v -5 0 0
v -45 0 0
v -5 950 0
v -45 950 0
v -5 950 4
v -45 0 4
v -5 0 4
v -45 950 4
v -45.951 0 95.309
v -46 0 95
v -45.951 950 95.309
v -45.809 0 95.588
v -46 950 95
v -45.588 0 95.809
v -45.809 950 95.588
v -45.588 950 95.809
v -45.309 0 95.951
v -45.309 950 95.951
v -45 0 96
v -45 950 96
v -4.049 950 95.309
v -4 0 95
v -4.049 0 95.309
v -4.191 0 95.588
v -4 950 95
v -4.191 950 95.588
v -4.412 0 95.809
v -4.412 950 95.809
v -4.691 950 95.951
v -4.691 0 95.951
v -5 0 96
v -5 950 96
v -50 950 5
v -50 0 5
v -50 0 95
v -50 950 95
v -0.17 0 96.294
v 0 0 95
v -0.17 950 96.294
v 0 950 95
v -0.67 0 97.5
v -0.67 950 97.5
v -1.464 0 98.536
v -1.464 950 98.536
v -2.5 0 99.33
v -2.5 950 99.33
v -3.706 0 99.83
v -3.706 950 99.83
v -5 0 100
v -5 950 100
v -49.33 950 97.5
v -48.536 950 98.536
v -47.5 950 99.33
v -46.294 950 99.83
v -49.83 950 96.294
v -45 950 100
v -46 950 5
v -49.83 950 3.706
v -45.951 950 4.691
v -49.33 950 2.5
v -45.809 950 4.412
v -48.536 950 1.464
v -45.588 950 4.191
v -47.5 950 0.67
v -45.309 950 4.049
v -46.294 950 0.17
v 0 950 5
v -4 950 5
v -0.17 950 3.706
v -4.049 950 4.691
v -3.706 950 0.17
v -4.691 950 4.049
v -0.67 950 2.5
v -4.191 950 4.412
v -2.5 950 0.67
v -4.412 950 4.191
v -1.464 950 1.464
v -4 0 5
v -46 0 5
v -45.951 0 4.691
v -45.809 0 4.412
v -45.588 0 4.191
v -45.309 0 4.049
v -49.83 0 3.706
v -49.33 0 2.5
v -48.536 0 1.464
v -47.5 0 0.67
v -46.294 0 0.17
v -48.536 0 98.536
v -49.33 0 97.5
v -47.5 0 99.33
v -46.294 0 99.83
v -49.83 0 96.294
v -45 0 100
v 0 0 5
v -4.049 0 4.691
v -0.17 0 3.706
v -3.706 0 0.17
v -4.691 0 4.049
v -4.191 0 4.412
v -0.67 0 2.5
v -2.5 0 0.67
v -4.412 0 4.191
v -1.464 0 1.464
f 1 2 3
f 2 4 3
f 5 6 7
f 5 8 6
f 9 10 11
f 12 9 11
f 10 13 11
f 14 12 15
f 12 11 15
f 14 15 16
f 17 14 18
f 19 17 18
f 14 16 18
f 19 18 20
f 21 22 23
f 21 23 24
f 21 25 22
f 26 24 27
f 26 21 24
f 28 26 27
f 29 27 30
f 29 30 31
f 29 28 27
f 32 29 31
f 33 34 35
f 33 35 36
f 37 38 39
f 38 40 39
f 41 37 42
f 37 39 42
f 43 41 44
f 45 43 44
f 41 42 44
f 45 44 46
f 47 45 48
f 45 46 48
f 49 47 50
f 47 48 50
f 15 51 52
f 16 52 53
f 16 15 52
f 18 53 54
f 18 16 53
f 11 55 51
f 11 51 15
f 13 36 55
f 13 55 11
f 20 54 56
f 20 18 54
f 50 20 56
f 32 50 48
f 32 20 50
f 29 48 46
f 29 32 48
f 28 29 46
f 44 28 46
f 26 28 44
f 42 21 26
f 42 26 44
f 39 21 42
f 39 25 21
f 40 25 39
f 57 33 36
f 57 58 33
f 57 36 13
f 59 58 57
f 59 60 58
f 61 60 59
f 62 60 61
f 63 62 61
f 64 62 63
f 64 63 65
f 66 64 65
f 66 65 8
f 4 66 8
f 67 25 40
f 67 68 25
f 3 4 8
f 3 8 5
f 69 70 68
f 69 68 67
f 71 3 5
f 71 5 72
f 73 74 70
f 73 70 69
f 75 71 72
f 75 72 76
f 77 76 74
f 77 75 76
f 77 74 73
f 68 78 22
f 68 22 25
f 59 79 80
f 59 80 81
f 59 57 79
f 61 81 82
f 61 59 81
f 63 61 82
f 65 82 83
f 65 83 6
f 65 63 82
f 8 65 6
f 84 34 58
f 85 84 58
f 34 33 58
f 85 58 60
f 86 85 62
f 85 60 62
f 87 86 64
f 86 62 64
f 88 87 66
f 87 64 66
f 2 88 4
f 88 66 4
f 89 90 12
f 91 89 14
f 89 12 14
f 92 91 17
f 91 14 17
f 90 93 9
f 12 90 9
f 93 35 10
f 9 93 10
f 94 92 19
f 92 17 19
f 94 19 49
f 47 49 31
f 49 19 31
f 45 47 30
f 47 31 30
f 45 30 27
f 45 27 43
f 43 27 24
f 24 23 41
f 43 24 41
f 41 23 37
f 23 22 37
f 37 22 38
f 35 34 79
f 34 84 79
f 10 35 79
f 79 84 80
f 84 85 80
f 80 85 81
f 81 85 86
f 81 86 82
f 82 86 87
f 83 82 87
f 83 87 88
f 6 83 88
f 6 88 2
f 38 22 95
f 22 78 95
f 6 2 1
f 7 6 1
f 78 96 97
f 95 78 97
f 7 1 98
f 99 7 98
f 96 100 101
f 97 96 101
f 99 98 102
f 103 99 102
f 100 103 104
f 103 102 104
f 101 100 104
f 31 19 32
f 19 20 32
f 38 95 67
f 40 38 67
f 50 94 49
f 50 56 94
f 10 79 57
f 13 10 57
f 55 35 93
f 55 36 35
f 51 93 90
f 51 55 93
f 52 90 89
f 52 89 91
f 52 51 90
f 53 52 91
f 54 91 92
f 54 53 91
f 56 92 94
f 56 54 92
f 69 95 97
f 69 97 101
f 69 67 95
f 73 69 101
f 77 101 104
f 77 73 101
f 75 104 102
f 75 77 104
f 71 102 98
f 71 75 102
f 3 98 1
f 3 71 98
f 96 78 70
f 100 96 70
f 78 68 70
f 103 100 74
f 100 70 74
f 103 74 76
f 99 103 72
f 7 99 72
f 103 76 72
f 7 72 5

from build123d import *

# Parameters (mm, degrees)
F0_W     = 50
F0_H     = 950
F1_DEPTH = 100
F2_R     = 5
F3_T     = -4


with BuildPart() as f1:
    # F0 (on Top) → F1 (new body)
    with BuildSketch(Plane.XY):
        with Locations((-25, 475)):
            Rectangle(F0_W, F0_H)
    extrude(amount=F1_DEPTH)

    # F2
    f2_edges = [f1.edges().sort_by_distance(p)[0] for p in [
        (0, 475, 100),
        (-50, 475, 100),
        (0, 475, 0),
        (-50, 475, 0),
    ]]
    fillet(f2_edges, radius=F2_R)

    # F3
    f3_openings = [f1.faces().sort_by_distance(p)[0] for p in [
        (-25, 0, 50),
        (-25, 950, 50),
    ]]
    offset(amount=F3_T, openings=f3_openings)


solid = f1.part
